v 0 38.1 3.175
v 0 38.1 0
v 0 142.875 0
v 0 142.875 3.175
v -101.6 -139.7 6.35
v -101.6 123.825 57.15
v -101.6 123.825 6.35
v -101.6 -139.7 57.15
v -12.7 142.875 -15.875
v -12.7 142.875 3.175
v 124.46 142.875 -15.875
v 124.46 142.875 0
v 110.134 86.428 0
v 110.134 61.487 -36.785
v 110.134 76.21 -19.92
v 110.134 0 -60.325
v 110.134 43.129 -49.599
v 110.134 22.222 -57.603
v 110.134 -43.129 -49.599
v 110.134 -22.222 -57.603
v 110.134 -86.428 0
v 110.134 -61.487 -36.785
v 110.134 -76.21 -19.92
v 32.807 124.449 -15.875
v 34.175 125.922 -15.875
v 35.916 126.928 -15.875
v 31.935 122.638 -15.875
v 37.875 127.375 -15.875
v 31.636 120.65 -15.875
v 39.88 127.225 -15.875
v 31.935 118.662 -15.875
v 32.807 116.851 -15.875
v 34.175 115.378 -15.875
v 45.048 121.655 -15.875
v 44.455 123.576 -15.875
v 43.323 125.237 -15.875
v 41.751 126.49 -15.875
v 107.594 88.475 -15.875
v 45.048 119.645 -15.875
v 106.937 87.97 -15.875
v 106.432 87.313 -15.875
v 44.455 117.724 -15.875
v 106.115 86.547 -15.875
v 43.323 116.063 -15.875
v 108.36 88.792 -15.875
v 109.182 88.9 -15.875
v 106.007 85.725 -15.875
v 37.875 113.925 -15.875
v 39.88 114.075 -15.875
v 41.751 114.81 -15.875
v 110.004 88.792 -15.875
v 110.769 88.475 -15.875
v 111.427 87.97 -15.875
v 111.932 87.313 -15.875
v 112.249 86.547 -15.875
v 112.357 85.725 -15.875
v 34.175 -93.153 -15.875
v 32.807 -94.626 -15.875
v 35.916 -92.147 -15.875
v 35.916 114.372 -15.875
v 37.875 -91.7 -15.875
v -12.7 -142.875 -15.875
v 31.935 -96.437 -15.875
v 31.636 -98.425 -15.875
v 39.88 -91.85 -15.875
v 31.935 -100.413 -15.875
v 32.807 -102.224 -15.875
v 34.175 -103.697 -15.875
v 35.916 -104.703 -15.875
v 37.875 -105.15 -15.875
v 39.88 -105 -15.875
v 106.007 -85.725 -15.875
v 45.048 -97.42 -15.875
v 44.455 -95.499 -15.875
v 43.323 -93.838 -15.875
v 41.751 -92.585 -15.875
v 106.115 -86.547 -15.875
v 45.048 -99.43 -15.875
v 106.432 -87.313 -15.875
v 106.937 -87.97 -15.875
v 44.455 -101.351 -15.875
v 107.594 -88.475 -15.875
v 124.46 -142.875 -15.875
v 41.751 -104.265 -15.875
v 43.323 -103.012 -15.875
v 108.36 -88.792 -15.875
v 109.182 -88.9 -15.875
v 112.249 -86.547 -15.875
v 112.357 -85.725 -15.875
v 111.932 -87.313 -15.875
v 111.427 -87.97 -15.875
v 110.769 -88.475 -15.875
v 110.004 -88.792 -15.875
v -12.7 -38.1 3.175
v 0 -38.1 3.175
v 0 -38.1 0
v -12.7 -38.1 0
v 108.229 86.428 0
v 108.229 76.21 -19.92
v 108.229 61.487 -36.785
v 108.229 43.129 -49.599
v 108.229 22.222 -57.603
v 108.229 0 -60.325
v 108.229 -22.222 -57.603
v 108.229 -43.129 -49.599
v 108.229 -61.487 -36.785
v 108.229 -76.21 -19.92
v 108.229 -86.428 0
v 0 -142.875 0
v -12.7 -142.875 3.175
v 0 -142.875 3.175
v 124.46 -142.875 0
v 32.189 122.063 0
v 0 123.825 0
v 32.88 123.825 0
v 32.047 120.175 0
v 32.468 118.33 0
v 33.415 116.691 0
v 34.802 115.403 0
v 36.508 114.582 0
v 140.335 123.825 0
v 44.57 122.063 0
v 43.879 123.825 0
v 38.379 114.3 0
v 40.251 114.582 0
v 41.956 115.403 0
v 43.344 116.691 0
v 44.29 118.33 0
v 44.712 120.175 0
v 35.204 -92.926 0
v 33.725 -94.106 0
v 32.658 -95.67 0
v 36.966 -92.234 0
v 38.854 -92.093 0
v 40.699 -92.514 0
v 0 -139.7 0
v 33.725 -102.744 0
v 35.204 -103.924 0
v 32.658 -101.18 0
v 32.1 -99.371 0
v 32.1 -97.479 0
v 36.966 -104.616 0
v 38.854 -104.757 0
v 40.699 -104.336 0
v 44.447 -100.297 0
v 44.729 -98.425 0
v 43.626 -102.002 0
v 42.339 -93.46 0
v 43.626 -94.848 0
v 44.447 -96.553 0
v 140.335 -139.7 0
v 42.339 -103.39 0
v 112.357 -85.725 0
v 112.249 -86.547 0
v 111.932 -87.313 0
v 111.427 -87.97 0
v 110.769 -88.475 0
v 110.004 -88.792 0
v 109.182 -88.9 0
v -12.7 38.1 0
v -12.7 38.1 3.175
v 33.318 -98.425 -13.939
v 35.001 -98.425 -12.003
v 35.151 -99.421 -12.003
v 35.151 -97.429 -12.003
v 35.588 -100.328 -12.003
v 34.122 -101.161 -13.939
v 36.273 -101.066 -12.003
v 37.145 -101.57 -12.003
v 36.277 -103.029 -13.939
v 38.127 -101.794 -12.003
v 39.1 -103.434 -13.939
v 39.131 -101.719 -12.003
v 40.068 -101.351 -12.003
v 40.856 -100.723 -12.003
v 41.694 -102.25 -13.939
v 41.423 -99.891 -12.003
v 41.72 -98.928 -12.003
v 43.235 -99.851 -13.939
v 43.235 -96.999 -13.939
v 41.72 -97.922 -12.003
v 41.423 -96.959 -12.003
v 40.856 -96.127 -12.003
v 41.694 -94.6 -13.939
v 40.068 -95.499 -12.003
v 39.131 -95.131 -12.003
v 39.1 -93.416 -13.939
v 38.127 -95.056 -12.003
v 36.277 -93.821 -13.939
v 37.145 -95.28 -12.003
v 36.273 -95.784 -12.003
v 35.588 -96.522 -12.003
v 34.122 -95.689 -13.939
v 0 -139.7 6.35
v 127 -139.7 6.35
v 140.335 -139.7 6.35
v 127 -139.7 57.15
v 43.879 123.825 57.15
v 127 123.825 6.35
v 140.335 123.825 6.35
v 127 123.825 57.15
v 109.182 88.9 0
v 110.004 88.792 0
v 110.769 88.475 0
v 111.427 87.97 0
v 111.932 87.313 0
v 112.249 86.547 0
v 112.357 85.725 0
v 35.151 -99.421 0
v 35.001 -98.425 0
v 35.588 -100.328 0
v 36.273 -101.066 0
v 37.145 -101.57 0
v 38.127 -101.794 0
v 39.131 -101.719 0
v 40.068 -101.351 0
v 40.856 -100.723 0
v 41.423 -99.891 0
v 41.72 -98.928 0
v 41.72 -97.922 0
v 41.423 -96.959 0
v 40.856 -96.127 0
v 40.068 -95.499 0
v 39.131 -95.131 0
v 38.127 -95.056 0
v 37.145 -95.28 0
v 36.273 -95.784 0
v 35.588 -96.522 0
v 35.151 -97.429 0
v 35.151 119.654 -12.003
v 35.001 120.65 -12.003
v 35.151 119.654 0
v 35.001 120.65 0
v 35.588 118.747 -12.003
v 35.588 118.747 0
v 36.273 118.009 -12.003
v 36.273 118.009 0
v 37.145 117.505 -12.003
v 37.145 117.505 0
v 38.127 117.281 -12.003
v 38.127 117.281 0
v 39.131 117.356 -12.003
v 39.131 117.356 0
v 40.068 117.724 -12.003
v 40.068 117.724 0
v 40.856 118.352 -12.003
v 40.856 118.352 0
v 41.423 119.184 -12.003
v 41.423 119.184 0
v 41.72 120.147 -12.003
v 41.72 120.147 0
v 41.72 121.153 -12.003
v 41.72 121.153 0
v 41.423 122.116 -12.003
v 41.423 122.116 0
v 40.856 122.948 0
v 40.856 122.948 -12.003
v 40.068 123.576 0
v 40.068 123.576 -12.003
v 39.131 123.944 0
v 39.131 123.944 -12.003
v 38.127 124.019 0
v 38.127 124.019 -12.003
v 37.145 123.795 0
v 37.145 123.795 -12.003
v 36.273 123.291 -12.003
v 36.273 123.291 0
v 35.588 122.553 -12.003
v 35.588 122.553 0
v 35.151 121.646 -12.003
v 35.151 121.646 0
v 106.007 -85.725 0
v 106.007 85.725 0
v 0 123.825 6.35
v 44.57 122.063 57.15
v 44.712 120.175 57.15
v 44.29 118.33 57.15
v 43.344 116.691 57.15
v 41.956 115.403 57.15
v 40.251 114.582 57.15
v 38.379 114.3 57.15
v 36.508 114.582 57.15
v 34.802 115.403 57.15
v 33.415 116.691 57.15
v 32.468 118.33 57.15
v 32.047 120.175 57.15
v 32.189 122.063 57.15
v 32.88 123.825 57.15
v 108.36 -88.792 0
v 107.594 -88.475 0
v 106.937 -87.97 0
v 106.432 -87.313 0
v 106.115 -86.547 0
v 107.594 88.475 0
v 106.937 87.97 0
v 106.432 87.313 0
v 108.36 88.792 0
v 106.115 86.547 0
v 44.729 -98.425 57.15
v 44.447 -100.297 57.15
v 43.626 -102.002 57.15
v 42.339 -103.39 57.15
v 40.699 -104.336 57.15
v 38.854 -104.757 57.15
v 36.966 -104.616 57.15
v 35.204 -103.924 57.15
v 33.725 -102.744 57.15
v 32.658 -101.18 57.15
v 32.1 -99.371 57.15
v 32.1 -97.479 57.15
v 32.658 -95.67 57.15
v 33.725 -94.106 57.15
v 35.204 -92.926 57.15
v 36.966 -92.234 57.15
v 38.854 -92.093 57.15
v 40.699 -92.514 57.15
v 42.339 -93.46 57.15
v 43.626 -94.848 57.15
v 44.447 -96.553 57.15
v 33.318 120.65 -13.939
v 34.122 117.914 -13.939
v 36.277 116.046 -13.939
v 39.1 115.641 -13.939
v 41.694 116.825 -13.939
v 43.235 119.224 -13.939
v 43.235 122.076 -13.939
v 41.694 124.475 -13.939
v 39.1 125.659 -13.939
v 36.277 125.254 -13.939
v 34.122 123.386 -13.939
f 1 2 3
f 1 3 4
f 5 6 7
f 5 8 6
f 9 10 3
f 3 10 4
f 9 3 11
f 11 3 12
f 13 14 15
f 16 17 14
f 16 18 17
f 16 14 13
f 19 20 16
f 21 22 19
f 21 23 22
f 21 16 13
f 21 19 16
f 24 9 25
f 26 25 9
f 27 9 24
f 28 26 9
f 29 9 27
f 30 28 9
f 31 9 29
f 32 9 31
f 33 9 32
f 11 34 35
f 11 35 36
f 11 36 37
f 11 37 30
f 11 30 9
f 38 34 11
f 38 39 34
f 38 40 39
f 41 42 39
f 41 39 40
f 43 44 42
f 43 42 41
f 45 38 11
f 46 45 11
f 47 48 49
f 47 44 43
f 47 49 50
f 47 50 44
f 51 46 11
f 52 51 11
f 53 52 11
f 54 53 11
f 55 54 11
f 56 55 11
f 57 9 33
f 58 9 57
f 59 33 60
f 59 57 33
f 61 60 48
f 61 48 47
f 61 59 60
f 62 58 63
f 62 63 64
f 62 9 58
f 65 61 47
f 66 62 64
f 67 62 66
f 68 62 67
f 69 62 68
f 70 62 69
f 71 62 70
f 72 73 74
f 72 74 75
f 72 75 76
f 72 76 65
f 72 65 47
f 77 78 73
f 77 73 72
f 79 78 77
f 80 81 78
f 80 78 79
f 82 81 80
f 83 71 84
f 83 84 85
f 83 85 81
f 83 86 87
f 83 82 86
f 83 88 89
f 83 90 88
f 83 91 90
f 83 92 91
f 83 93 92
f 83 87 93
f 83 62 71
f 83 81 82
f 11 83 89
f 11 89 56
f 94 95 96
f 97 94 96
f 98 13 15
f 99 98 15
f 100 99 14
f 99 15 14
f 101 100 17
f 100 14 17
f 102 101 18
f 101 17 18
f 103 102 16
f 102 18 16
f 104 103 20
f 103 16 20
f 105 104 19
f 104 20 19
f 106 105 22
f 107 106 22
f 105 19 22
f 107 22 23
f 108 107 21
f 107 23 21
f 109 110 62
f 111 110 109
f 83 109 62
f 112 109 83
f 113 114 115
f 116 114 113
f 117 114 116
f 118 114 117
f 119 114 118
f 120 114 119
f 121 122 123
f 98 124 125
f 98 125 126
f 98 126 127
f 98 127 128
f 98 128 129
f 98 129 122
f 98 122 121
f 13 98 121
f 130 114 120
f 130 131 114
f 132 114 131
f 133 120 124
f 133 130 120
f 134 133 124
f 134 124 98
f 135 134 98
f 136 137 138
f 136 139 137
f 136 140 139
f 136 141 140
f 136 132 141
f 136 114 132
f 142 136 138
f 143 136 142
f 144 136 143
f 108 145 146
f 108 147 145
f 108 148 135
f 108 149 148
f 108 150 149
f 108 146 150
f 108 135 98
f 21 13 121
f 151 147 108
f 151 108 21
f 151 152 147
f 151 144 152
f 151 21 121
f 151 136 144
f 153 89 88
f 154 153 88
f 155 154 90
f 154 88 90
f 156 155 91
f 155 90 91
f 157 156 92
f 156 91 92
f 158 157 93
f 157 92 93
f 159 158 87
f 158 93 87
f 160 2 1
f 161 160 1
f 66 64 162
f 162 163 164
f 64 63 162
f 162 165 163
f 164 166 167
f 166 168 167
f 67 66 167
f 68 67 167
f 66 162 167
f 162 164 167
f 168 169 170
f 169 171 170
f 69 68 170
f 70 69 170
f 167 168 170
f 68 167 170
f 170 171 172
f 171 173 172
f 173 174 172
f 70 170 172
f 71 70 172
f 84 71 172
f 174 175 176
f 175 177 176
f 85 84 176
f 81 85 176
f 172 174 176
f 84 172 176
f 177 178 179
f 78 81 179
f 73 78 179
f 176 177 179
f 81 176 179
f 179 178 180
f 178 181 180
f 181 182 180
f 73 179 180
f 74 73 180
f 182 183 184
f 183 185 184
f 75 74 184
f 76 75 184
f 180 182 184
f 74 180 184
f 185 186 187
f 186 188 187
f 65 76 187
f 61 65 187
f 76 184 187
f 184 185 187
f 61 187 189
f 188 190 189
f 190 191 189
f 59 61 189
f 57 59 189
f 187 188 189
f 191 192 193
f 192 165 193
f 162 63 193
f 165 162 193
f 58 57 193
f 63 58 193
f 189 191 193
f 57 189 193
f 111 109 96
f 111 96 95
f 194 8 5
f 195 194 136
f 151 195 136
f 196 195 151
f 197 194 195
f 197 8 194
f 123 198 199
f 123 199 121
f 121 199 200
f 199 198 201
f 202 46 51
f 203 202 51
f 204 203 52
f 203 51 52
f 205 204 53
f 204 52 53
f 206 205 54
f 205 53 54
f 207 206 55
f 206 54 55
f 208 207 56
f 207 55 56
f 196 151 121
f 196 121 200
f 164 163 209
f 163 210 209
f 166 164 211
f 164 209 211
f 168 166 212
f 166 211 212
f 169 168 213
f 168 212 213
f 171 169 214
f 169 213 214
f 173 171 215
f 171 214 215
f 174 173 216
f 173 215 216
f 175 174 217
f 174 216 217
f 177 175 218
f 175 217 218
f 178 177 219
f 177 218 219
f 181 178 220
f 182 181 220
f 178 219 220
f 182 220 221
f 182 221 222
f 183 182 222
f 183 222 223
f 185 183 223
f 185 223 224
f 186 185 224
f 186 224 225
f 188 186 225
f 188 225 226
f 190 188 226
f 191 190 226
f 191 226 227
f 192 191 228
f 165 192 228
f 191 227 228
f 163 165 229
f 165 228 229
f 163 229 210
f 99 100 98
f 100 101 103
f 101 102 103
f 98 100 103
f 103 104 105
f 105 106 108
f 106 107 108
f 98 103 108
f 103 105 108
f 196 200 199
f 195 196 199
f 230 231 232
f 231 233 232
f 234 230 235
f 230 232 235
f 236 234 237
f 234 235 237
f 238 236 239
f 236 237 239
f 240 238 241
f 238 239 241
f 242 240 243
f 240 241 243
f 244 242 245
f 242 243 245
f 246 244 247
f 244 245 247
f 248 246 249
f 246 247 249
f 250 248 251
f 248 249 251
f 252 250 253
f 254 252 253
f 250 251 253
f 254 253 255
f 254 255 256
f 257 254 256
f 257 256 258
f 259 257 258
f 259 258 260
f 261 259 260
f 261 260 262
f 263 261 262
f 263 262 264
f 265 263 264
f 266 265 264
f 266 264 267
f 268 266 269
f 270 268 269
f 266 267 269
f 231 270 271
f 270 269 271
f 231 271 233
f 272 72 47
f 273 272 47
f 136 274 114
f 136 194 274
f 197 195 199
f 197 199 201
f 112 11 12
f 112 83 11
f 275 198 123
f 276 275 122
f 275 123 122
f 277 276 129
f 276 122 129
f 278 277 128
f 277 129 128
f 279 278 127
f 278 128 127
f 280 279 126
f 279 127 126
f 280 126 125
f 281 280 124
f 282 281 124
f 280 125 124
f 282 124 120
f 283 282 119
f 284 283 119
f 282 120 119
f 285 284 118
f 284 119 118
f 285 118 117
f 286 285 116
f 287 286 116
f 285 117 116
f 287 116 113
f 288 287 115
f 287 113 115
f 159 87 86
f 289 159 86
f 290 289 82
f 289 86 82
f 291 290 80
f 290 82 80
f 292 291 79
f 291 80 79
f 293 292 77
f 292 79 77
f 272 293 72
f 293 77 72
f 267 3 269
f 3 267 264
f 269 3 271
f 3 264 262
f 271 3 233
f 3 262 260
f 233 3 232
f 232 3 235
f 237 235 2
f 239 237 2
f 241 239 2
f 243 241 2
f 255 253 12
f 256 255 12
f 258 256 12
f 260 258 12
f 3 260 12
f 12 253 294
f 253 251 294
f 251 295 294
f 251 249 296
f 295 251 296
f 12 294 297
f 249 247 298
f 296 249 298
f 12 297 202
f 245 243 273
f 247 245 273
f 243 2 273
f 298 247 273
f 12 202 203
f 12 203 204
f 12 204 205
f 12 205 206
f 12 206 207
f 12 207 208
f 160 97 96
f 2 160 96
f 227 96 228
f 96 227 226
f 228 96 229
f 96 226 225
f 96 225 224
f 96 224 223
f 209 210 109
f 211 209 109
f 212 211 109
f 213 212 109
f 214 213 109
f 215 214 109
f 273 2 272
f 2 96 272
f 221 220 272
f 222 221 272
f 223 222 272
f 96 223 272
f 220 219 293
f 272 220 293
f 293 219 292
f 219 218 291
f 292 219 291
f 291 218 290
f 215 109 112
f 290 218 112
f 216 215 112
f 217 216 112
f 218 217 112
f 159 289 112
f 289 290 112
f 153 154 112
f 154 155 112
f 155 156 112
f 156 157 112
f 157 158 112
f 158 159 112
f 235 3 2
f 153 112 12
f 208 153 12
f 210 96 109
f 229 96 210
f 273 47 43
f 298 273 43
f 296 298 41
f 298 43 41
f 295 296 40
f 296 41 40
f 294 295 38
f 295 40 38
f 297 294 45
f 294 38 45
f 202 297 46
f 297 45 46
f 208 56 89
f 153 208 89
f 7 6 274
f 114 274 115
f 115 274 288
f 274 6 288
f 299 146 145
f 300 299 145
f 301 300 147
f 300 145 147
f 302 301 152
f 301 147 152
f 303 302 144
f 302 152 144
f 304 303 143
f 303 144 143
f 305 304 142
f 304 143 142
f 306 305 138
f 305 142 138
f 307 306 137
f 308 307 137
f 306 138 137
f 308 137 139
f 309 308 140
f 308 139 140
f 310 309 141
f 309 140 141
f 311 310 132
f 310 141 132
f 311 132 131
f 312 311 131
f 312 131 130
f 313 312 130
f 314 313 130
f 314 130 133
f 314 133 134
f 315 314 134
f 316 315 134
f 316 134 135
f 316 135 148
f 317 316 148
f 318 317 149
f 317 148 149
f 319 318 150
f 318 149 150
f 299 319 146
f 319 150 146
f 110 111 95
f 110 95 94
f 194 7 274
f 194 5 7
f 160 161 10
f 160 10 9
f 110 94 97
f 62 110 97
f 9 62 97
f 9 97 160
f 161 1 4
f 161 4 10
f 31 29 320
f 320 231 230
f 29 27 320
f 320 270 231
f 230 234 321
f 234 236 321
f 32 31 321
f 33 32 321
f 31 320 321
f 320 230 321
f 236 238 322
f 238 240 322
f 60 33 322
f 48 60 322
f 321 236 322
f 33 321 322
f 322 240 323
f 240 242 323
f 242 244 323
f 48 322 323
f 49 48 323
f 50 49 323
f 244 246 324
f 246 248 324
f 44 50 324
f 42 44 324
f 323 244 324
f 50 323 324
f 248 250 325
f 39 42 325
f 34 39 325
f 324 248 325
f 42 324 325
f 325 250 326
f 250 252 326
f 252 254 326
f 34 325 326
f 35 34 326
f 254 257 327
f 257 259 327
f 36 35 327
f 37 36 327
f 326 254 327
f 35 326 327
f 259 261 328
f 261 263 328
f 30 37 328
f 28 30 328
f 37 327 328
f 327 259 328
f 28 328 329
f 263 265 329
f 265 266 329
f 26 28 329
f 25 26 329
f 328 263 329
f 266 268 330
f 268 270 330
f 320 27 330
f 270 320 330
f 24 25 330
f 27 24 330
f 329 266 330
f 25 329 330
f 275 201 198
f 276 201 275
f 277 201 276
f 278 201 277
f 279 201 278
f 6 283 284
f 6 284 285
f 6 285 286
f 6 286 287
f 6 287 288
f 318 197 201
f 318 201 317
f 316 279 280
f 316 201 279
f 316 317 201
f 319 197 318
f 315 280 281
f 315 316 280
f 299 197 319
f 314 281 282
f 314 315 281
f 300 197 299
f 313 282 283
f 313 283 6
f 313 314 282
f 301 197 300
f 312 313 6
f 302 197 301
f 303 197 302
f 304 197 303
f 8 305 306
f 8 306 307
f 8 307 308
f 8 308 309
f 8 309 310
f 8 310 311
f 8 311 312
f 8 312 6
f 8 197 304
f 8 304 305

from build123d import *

# Parameters (mm, degrees)
F0_W            = 1.905
F0_H            = 60.96
F1_DEPTH        = 139.7
F1_DEPTH_BACK   = 123.825
F2_W            = 124.46
F2_H            = 15.875
F3_DEPTH        = 142.875
F3_DEPTH_BACK   = 142.875
F6_DEPTH        = 1.905
F7_R            = 6.35
F8_DEPTH        = 57.15
F11_D           = 6.7564
F11_CSINK_D     = 13.4874
F11_CSINK_ANGLE = 82
F12_DEPTH       = 73.025
F14_DEPTH       = 12.7


with BuildPart() as f1:
    # F0 (on Front) → F1 (new body, two sides)
    with BuildSketch(Plane.XZ) as f1_sk:
        Polygon((0, 6.35), (0, 0), (108.2294, 0), (110.1344, 0), (140.335, 0), (140.335, 6.35), (127, 6.35), align=None)
        with Locations((109.1819, -30.48)):
            Rectangle(F0_W, F0_H)
        Polygon((-101.6, 6.35), (0, 6.35), (127, 6.35), (127, 57.15), (-101.6, 57.15), align=None)
    extrude(amount=F1_DEPTH)
    extrude(f1_sk.sketch, amount=-F1_DEPTH_BACK)

    # F5 (on face) → F6 (cut, through all)
    with BuildSketch(Plane.YZ.offset(110.1344)):
        with BuildLine():
            Line((-86.427675689, 0), (-139.7, 0))
            Line((-139.7, 0), (-139.7, -60.96))
            Line((-139.7, -60.96), (-139.7, -88.9))
            Line((-139.7, -88.9), (152.4, -88.9))
            Line((152.4, -88.9), (152.4, 0))
            Line((152.4, 0), (123.825, 0))
            Line((123.825, 0), (86.427675689, 0))
            ThreePointArc((86.427675689, 0), (0, -60.325), (-86.427675689, 0))
        make_face()
    extrude(amount=-F6_DEPTH, mode=Mode.SUBTRACT)

    # F7 (on face) → F8 (cut, through all)
    with BuildSketch(Plane(origin=(0, 0, 0), x_dir=(1, 0, 0), z_dir=(0, 0, -1))):
        with Locations((38.3794, -120.65)):
            Circle(F7_R)
        with Locations((38.3794, 98.425)):
            Circle(F7_R)
    extrude(amount=-F8_DEPTH, mode=Mode.SUBTRACT)


with BuildPart() as f3:
    # F2 (on Front) → F3 (new body, two sides)
    with BuildSketch(Plane.XZ) as f3_sk:
        with Locations((62.23, -7.9375)):
            Rectangle(F2_W, F2_H)
        Polygon((0, -15.875), (0, 0), (0, 3.175), (-12.7, 3.175), (-12.7, -15.875), align=None)
    extrude(amount=F3_DEPTH)
    extrude(f3_sk.sketch, amount=-F3_DEPTH_BACK)

    # F11 (through all)
    with Locations(Plane(origin=(0, 0, -15.875), x_dir=(1, 0, 0), z_dir=(0, 0, -1))):
        with Locations((38.3794, -120.65), (38.3794, 98.425)):
            CounterSinkHole(F11_D / 2, F11_CSINK_D / 2, counter_sink_angle=F11_CSINK_ANGLE)

    # F4 (on face) → F12 (cut, through all)
    with BuildSketch(Plane(origin=(0, 0, -15.875), x_dir=(1, 0, 0), z_dir=(0, 0, -1))):
        with BuildLine():
            Line((112.3569, -85.725), (112.3569, 85.725))
            ThreePointArc((112.3569, 85.725), (111.4269640303, 87.9700640303), (109.1819, 88.9))
            ThreePointArc((109.1819, 88.9), (106.9368359697, 87.9700640303), (106.0069, 85.725))
            Line((106.0069, 85.725), (106.0069, -85.725))
            ThreePointArc((106.0069, -85.725), (106.9368359697, -87.9700640303), (109.1819, -88.9))
            ThreePointArc((109.1819, -88.9), (111.4269640303, -87.9700640303), (112.3569, -85.725))
        make_face()
    extrude(amount=-F12_DEPTH, mode=Mode.SUBTRACT)

    # F13 (on face) → F14 (cut, through all)
    with BuildSketch(Plane.YZ):
        Polygon((-38.1, 0), (0, 0), (38.1, 0), (38.1, 3.175), (0, 3.175), (-38.1, 3.175), align=None)
    extrude(amount=-F14_DEPTH, mode=Mode.SUBTRACT)


solid = Compound([f1.part, f3.part])
